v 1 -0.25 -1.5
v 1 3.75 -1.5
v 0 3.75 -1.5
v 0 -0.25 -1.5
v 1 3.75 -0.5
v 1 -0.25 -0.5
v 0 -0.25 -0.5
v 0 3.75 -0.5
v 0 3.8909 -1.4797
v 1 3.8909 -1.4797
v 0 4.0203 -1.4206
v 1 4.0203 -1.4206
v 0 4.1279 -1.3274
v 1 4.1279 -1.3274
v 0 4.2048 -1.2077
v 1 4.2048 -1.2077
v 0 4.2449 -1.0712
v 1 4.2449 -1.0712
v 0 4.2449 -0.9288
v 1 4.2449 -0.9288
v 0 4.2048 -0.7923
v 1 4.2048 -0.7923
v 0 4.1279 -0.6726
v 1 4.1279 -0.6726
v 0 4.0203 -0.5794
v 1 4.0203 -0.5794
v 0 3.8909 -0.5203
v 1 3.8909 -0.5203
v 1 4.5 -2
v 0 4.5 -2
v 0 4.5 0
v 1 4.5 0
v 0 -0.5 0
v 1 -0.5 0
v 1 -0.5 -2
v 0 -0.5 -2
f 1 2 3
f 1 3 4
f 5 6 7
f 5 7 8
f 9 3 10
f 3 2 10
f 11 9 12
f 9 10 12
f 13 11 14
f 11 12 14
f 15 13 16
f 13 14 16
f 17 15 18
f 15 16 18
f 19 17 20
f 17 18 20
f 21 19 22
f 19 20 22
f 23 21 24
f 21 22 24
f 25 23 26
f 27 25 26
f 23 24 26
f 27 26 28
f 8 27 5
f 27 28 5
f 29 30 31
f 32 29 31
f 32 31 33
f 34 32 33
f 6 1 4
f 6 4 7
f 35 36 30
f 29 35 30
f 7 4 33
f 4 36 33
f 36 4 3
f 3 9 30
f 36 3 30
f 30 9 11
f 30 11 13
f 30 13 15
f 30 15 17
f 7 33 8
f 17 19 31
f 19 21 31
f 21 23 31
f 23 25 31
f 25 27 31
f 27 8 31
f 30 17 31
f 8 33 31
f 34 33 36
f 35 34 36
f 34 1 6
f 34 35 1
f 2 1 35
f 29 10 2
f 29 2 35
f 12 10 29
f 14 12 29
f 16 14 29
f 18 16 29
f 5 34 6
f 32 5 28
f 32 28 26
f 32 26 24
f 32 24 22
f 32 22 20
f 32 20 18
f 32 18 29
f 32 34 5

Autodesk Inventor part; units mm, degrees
ref_plane "YZ Plane" through (0, 0, 0) normal (1, 0, 0) x (0, 1, 0)
ref_plane "XZ Plane" through (0, 0, 0) normal (0, 1, 0) x (-1, 0, 0)
ref_plane "XY Plane" through (0, 0, 0) normal (0, 0, 1) x (1, 0, 0)
sketch "스케치1" plane through (0, 0, 0) normal (1, 0, 0) x (0, 1, 0)
  line L0 (4.5, 0) -> (-0.5, 0)
  line L1 (-0.5, 0) -> (-0.5, -2)
  line L2 (-0.5, -2) -> (4.5, -2)
  line L3 (4.5, -2) -> (4.5, 0)
  point P0 (0, 0)
  dimension "d0" = 5
  dimension "d1" = 2
  dimension "d2" = 4.5
  dimension "d3" = 2
extrude "돌출1" add sketch "스케치1" along normal blind 1
sketch "스케치3" plane through (1, 0, 0) normal (1, 0, 0) x (0, 0, -1)
  line L0 (1, 4.25) -> (1, 4.25)
  line L1 (1.5, 3.75) -> (1.5, -0.25)
  line L2 (1.5, -0.25) -> (0.5, -0.25)
  line L3 (0.5, -0.25) -> (0.5, 3.75)
  arc A0 (1, 4.25) -> (0.5, 3.75) centre (1, 3.75) ccw
  arc A1 (1.5, 3.75) -> (1, 4.25) centre (1, 3.75) ccw
  point P0 (0, 0)
  point P1 (0.5, 4.25)
  point P2 (1.5, 4.25)
  dimension "d13" = 1
  dimension "d14" = 4.5
  dimension "d15" = 4.25
  dimension "d16" = 1.5
  dimension "d19" = 0.5
extrude "돌출2" cut sketch "스케치3" against normal blind 1
properties part number "뚫린 직육면체"
